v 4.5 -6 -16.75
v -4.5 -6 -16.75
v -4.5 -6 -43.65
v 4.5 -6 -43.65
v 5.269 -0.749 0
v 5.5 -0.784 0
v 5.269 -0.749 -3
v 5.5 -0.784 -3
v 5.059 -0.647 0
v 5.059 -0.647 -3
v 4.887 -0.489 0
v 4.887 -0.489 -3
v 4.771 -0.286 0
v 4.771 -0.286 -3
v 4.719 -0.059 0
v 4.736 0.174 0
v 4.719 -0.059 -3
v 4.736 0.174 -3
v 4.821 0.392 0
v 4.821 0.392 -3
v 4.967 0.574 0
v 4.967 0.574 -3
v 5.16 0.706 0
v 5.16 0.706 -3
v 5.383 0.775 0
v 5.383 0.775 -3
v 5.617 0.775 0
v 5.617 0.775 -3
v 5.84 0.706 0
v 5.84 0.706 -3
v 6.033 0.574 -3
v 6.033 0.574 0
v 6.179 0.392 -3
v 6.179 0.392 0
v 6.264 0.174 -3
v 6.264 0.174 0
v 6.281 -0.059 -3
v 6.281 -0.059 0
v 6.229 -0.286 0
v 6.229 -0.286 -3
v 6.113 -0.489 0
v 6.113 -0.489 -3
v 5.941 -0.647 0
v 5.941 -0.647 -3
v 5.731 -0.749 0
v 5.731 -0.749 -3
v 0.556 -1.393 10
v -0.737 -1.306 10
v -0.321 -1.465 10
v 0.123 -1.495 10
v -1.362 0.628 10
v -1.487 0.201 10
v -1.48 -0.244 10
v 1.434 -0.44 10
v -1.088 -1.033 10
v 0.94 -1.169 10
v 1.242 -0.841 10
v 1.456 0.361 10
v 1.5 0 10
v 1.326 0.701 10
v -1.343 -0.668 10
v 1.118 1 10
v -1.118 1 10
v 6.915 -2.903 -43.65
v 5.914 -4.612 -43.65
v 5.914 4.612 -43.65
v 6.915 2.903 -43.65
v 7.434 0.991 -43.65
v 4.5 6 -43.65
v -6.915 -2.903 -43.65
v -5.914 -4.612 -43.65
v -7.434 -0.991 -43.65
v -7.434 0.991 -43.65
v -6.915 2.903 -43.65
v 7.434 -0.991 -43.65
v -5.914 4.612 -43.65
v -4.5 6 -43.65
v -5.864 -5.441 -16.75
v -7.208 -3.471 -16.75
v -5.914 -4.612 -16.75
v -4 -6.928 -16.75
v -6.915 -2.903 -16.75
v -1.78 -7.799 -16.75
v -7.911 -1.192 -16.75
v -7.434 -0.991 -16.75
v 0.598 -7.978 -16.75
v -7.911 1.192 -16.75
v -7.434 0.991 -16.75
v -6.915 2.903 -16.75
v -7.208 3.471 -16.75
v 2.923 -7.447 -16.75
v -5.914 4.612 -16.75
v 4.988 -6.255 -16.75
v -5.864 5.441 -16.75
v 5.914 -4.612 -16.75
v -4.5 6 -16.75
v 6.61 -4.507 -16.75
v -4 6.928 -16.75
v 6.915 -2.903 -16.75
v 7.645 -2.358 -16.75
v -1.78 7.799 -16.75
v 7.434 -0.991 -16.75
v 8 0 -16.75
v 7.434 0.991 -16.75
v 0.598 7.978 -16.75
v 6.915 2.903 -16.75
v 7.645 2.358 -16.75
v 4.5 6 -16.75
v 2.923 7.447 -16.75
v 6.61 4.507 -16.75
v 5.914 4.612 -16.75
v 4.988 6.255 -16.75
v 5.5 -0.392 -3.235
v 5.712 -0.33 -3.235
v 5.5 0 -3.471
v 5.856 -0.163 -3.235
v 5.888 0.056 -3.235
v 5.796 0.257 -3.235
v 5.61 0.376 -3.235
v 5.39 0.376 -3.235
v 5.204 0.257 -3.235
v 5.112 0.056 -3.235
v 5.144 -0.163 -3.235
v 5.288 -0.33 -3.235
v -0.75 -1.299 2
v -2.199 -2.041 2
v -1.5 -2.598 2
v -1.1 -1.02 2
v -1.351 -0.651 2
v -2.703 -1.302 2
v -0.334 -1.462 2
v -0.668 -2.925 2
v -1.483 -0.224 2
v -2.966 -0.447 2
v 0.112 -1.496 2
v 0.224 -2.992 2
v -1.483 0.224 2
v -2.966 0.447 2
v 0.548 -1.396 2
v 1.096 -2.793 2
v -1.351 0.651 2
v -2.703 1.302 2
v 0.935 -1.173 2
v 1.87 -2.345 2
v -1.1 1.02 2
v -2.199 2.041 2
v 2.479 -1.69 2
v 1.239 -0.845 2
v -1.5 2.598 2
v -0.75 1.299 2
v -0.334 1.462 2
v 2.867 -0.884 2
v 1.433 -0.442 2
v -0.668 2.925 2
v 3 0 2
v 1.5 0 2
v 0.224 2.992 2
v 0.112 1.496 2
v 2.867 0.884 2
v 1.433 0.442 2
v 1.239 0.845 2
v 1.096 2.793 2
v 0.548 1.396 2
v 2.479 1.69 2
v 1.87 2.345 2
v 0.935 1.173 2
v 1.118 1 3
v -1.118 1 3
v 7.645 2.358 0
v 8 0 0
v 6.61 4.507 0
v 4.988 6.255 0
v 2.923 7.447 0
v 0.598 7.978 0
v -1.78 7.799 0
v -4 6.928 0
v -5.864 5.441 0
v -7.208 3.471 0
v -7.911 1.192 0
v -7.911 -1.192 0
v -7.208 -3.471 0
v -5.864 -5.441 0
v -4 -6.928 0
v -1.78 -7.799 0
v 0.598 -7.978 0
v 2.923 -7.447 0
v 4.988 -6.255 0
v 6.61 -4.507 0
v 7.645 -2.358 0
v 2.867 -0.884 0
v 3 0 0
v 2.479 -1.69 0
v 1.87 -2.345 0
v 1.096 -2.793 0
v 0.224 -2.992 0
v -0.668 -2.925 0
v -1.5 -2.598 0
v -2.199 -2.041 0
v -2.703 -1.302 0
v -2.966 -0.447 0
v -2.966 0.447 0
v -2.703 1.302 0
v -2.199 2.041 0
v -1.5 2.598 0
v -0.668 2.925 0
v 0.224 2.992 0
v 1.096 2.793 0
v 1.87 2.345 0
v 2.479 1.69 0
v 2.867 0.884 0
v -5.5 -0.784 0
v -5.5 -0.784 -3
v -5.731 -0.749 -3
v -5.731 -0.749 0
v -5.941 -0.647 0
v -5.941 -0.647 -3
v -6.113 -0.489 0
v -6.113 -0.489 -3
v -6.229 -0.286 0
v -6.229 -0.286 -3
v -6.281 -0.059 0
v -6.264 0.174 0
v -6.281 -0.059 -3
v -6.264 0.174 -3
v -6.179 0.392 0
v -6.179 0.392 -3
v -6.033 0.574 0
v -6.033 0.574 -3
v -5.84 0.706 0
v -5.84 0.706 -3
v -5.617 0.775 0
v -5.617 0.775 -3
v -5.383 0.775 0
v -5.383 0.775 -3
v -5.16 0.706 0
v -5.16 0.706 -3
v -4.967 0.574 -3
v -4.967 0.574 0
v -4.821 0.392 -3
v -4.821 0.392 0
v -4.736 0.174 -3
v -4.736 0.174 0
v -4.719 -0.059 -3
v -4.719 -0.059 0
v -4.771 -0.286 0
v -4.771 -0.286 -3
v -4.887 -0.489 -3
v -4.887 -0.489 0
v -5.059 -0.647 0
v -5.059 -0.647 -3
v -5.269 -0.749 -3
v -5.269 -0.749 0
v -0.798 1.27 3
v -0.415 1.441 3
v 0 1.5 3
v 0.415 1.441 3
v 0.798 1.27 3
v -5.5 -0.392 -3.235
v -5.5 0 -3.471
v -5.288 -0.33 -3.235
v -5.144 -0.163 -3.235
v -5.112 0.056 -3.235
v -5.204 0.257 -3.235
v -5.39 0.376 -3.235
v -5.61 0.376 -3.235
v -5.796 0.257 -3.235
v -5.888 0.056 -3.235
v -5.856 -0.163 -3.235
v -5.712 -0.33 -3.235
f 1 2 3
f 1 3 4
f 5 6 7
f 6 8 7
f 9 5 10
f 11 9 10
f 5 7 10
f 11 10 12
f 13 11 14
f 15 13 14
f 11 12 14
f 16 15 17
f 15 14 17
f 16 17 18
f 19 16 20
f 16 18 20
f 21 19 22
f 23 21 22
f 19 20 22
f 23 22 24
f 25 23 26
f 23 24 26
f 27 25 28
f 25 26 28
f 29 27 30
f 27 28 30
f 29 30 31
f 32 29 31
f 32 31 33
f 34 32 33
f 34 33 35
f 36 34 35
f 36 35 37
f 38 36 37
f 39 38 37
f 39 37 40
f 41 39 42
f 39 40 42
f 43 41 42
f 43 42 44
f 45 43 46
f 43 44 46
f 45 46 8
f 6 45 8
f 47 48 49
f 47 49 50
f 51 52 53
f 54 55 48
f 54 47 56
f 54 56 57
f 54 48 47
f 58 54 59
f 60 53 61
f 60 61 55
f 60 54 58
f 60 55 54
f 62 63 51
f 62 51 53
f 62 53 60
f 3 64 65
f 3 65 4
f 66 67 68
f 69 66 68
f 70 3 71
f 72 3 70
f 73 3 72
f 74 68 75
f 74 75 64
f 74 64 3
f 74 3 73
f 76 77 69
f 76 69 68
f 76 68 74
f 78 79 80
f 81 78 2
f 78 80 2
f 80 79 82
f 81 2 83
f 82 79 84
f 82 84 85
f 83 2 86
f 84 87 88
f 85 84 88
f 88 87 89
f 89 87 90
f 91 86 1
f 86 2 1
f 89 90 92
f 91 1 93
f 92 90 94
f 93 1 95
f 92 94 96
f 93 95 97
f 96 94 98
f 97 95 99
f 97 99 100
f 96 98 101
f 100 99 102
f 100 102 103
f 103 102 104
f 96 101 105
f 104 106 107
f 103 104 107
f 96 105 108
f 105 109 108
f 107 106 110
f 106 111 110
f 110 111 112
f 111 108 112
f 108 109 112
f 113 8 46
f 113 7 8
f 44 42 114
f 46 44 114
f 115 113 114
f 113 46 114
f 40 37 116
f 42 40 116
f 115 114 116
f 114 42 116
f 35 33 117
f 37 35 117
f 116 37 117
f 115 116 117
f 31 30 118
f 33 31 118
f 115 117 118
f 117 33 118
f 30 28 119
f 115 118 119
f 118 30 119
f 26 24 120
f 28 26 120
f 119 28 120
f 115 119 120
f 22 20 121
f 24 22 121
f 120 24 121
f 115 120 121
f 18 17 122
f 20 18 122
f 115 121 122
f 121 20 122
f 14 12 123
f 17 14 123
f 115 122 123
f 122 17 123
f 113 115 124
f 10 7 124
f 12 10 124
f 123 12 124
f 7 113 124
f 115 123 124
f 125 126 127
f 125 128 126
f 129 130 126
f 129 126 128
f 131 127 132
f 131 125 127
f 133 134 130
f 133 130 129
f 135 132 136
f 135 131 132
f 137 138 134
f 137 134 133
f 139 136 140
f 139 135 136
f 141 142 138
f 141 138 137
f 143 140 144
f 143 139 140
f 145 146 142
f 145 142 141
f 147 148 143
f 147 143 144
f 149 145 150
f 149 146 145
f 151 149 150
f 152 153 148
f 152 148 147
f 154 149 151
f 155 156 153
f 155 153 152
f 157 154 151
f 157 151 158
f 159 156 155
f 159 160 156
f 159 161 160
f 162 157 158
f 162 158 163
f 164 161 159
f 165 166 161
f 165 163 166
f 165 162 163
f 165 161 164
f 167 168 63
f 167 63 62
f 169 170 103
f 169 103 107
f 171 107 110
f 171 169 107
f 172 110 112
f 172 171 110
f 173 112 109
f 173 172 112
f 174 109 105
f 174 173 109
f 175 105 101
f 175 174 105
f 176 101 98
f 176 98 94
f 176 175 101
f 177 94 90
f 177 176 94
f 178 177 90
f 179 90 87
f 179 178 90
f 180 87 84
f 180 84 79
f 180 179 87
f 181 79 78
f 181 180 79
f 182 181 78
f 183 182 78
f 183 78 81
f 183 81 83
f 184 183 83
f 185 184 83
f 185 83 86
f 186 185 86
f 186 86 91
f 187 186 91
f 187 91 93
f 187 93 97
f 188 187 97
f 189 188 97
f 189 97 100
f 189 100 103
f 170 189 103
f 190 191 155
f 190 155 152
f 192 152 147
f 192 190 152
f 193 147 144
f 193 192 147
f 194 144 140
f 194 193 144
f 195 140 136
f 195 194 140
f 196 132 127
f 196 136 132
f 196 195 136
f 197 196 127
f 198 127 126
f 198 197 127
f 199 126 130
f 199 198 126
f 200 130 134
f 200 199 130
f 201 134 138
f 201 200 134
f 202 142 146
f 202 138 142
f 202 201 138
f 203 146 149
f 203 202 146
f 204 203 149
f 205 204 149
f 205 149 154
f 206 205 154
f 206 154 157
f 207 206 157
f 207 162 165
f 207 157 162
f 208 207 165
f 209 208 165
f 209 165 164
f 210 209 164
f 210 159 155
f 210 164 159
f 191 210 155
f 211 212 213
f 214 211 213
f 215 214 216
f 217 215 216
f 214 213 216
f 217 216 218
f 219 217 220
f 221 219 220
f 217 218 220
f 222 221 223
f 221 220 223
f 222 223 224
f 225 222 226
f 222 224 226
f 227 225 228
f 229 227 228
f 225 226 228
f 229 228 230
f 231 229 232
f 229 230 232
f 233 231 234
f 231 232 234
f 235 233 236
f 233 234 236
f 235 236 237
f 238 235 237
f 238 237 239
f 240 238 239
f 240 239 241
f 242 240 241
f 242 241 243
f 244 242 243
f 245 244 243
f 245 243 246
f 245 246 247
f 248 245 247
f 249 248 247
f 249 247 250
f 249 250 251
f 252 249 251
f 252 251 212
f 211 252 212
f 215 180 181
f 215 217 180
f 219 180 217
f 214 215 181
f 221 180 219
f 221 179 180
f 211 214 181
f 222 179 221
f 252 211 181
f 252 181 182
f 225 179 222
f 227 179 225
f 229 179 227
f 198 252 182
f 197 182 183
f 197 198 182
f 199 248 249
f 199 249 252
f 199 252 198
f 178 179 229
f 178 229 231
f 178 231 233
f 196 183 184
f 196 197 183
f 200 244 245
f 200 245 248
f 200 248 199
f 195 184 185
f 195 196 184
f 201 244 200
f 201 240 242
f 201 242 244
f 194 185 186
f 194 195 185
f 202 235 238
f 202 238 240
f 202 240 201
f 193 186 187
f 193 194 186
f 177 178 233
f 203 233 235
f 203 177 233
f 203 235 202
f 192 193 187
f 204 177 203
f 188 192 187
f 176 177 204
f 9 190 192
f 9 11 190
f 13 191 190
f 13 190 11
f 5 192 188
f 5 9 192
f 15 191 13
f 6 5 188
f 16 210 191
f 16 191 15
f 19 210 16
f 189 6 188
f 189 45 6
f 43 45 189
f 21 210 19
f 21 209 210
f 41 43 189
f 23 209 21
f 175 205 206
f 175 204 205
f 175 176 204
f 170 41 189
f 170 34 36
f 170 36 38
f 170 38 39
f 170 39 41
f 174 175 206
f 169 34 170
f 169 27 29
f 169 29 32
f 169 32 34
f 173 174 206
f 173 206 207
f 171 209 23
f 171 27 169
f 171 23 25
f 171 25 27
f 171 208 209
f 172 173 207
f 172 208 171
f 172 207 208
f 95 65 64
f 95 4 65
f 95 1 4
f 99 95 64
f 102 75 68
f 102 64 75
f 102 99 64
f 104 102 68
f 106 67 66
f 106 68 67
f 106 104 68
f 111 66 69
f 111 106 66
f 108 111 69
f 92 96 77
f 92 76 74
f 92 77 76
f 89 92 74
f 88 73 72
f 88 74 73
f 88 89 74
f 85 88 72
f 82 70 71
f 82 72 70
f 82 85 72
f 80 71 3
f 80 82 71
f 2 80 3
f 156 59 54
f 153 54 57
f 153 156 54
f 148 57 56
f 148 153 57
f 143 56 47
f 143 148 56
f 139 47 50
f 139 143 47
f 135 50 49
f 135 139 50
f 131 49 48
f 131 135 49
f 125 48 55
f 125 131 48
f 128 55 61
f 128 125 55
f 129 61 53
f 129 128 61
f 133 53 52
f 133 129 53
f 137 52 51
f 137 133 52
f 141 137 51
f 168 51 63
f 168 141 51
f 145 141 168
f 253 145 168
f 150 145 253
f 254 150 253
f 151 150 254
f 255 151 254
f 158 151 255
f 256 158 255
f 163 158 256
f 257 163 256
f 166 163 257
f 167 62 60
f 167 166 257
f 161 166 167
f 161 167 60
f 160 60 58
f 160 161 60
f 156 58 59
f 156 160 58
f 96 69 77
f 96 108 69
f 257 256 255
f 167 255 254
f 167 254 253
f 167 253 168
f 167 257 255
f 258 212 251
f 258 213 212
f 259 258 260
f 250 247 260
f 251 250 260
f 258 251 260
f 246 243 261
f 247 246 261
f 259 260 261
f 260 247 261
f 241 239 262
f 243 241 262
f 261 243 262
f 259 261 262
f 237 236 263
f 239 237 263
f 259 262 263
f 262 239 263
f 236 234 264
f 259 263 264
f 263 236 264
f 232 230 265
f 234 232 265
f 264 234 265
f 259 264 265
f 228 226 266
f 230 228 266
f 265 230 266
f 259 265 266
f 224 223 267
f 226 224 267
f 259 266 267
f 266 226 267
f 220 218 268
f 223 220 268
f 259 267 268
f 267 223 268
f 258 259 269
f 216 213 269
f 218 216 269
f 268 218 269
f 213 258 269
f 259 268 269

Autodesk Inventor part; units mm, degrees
ref_plane "YZ Plane" through (0, 0, 0) normal (1, 0, 0) x (0, 1, 0)
ref_plane "XZ Plane" through (0, 0, 0) normal (0, 1, 0) x (-1, 0, 0)
ref_plane "XY Plane" through (0, 0, 0) normal (0, 0, 1) x (1, 0, 0)
sketch "Skizze1" plane through (0, 0, 0) normal (0, 0, 1) x (1, 0, 0)
  circle A0 centre (0, 0) radius 8
  line L0 (-5.5, 0) -> (5.5, 0) construction
  circle A1 centre (0, 0) radius 3
  circle A2 centre (0, 0) radius 1.5
  arc A3 (-1.118, 1) -> (1.118, 1) centre (0, 0) ccw construction
  line L1 (-1.118, 1) -> (1.118, 1)
  dimension "d3" = 3
  dimension "d0" = 16
  dimension "d1" = 11
  dimension "d2" = 6
  dimension "d4" = 2.5
extrude "Extrusion1" add sketch "Skizze1" along normal blind 2 contours A1 | A2 L1 | L1 A2
sketch "Skizze2" plane through (0, 0, 2) normal (0, 0, 1) x (1, 0, 0)
  circle A0 centre (0, 0) radius 1.5 projected
extrude "Extrusion2" add sketch "Skizze2" along normal blind 1
sketch "Skizze3" plane through (0, 0, 3) normal (0, 0, 1) x (1, 0, 0)
  circle A0 centre (0, 0) radius 1.5 projected
  line L0 (-1.118, 1) -> (1.118, 1) projected
  circle A1 centre (0, 0) radius 1.5 projected
extrude "Extrusion3" add sketch "Skizze3" along normal blind 7 contours A0 L0 picked at (0.0594, 0.1702)
extrude "Extrusion4" add sketch "Skizze1" against normal blind 16.75 contours A0 | A1 | A2 L1 | L1 A2
sketch "Skizze4" plane through (0, 0, -16.75) normal (0, 0, -1) x (-1, 0, 0)
  circle A0 centre (0, 0) radius 8 projected
  arc A1 (-4.5, 6) -> (-4.5, -6) centre (0, 0) ccw
  arc A2 (4.5, -6) -> (4.5, 6) centre (0, 0) ccw
  line L0 (-4.5, 6) -> (4.5, 6)
  line L1 (4.5, -6) -> (-4.5, -6)
  dimension "d14" = 7.5
  dimension "d15" = 12
extrude "Extrusion5" add sketch "Skizze4" along normal blind 26.9 contours L0 A2 L1 A1
hole "Bohrung1" at (-5.5, 0, 0) at (5.5, 0, 0) direction (0, 0, -1) diameter 1.567 depth 3 tip angle 118 thread size "M2x0.4" class "6H" standard "ANSI Metric M Profile"
properties part number "DC-Motor_12V_150U-min" material "Aluminium 6061"
